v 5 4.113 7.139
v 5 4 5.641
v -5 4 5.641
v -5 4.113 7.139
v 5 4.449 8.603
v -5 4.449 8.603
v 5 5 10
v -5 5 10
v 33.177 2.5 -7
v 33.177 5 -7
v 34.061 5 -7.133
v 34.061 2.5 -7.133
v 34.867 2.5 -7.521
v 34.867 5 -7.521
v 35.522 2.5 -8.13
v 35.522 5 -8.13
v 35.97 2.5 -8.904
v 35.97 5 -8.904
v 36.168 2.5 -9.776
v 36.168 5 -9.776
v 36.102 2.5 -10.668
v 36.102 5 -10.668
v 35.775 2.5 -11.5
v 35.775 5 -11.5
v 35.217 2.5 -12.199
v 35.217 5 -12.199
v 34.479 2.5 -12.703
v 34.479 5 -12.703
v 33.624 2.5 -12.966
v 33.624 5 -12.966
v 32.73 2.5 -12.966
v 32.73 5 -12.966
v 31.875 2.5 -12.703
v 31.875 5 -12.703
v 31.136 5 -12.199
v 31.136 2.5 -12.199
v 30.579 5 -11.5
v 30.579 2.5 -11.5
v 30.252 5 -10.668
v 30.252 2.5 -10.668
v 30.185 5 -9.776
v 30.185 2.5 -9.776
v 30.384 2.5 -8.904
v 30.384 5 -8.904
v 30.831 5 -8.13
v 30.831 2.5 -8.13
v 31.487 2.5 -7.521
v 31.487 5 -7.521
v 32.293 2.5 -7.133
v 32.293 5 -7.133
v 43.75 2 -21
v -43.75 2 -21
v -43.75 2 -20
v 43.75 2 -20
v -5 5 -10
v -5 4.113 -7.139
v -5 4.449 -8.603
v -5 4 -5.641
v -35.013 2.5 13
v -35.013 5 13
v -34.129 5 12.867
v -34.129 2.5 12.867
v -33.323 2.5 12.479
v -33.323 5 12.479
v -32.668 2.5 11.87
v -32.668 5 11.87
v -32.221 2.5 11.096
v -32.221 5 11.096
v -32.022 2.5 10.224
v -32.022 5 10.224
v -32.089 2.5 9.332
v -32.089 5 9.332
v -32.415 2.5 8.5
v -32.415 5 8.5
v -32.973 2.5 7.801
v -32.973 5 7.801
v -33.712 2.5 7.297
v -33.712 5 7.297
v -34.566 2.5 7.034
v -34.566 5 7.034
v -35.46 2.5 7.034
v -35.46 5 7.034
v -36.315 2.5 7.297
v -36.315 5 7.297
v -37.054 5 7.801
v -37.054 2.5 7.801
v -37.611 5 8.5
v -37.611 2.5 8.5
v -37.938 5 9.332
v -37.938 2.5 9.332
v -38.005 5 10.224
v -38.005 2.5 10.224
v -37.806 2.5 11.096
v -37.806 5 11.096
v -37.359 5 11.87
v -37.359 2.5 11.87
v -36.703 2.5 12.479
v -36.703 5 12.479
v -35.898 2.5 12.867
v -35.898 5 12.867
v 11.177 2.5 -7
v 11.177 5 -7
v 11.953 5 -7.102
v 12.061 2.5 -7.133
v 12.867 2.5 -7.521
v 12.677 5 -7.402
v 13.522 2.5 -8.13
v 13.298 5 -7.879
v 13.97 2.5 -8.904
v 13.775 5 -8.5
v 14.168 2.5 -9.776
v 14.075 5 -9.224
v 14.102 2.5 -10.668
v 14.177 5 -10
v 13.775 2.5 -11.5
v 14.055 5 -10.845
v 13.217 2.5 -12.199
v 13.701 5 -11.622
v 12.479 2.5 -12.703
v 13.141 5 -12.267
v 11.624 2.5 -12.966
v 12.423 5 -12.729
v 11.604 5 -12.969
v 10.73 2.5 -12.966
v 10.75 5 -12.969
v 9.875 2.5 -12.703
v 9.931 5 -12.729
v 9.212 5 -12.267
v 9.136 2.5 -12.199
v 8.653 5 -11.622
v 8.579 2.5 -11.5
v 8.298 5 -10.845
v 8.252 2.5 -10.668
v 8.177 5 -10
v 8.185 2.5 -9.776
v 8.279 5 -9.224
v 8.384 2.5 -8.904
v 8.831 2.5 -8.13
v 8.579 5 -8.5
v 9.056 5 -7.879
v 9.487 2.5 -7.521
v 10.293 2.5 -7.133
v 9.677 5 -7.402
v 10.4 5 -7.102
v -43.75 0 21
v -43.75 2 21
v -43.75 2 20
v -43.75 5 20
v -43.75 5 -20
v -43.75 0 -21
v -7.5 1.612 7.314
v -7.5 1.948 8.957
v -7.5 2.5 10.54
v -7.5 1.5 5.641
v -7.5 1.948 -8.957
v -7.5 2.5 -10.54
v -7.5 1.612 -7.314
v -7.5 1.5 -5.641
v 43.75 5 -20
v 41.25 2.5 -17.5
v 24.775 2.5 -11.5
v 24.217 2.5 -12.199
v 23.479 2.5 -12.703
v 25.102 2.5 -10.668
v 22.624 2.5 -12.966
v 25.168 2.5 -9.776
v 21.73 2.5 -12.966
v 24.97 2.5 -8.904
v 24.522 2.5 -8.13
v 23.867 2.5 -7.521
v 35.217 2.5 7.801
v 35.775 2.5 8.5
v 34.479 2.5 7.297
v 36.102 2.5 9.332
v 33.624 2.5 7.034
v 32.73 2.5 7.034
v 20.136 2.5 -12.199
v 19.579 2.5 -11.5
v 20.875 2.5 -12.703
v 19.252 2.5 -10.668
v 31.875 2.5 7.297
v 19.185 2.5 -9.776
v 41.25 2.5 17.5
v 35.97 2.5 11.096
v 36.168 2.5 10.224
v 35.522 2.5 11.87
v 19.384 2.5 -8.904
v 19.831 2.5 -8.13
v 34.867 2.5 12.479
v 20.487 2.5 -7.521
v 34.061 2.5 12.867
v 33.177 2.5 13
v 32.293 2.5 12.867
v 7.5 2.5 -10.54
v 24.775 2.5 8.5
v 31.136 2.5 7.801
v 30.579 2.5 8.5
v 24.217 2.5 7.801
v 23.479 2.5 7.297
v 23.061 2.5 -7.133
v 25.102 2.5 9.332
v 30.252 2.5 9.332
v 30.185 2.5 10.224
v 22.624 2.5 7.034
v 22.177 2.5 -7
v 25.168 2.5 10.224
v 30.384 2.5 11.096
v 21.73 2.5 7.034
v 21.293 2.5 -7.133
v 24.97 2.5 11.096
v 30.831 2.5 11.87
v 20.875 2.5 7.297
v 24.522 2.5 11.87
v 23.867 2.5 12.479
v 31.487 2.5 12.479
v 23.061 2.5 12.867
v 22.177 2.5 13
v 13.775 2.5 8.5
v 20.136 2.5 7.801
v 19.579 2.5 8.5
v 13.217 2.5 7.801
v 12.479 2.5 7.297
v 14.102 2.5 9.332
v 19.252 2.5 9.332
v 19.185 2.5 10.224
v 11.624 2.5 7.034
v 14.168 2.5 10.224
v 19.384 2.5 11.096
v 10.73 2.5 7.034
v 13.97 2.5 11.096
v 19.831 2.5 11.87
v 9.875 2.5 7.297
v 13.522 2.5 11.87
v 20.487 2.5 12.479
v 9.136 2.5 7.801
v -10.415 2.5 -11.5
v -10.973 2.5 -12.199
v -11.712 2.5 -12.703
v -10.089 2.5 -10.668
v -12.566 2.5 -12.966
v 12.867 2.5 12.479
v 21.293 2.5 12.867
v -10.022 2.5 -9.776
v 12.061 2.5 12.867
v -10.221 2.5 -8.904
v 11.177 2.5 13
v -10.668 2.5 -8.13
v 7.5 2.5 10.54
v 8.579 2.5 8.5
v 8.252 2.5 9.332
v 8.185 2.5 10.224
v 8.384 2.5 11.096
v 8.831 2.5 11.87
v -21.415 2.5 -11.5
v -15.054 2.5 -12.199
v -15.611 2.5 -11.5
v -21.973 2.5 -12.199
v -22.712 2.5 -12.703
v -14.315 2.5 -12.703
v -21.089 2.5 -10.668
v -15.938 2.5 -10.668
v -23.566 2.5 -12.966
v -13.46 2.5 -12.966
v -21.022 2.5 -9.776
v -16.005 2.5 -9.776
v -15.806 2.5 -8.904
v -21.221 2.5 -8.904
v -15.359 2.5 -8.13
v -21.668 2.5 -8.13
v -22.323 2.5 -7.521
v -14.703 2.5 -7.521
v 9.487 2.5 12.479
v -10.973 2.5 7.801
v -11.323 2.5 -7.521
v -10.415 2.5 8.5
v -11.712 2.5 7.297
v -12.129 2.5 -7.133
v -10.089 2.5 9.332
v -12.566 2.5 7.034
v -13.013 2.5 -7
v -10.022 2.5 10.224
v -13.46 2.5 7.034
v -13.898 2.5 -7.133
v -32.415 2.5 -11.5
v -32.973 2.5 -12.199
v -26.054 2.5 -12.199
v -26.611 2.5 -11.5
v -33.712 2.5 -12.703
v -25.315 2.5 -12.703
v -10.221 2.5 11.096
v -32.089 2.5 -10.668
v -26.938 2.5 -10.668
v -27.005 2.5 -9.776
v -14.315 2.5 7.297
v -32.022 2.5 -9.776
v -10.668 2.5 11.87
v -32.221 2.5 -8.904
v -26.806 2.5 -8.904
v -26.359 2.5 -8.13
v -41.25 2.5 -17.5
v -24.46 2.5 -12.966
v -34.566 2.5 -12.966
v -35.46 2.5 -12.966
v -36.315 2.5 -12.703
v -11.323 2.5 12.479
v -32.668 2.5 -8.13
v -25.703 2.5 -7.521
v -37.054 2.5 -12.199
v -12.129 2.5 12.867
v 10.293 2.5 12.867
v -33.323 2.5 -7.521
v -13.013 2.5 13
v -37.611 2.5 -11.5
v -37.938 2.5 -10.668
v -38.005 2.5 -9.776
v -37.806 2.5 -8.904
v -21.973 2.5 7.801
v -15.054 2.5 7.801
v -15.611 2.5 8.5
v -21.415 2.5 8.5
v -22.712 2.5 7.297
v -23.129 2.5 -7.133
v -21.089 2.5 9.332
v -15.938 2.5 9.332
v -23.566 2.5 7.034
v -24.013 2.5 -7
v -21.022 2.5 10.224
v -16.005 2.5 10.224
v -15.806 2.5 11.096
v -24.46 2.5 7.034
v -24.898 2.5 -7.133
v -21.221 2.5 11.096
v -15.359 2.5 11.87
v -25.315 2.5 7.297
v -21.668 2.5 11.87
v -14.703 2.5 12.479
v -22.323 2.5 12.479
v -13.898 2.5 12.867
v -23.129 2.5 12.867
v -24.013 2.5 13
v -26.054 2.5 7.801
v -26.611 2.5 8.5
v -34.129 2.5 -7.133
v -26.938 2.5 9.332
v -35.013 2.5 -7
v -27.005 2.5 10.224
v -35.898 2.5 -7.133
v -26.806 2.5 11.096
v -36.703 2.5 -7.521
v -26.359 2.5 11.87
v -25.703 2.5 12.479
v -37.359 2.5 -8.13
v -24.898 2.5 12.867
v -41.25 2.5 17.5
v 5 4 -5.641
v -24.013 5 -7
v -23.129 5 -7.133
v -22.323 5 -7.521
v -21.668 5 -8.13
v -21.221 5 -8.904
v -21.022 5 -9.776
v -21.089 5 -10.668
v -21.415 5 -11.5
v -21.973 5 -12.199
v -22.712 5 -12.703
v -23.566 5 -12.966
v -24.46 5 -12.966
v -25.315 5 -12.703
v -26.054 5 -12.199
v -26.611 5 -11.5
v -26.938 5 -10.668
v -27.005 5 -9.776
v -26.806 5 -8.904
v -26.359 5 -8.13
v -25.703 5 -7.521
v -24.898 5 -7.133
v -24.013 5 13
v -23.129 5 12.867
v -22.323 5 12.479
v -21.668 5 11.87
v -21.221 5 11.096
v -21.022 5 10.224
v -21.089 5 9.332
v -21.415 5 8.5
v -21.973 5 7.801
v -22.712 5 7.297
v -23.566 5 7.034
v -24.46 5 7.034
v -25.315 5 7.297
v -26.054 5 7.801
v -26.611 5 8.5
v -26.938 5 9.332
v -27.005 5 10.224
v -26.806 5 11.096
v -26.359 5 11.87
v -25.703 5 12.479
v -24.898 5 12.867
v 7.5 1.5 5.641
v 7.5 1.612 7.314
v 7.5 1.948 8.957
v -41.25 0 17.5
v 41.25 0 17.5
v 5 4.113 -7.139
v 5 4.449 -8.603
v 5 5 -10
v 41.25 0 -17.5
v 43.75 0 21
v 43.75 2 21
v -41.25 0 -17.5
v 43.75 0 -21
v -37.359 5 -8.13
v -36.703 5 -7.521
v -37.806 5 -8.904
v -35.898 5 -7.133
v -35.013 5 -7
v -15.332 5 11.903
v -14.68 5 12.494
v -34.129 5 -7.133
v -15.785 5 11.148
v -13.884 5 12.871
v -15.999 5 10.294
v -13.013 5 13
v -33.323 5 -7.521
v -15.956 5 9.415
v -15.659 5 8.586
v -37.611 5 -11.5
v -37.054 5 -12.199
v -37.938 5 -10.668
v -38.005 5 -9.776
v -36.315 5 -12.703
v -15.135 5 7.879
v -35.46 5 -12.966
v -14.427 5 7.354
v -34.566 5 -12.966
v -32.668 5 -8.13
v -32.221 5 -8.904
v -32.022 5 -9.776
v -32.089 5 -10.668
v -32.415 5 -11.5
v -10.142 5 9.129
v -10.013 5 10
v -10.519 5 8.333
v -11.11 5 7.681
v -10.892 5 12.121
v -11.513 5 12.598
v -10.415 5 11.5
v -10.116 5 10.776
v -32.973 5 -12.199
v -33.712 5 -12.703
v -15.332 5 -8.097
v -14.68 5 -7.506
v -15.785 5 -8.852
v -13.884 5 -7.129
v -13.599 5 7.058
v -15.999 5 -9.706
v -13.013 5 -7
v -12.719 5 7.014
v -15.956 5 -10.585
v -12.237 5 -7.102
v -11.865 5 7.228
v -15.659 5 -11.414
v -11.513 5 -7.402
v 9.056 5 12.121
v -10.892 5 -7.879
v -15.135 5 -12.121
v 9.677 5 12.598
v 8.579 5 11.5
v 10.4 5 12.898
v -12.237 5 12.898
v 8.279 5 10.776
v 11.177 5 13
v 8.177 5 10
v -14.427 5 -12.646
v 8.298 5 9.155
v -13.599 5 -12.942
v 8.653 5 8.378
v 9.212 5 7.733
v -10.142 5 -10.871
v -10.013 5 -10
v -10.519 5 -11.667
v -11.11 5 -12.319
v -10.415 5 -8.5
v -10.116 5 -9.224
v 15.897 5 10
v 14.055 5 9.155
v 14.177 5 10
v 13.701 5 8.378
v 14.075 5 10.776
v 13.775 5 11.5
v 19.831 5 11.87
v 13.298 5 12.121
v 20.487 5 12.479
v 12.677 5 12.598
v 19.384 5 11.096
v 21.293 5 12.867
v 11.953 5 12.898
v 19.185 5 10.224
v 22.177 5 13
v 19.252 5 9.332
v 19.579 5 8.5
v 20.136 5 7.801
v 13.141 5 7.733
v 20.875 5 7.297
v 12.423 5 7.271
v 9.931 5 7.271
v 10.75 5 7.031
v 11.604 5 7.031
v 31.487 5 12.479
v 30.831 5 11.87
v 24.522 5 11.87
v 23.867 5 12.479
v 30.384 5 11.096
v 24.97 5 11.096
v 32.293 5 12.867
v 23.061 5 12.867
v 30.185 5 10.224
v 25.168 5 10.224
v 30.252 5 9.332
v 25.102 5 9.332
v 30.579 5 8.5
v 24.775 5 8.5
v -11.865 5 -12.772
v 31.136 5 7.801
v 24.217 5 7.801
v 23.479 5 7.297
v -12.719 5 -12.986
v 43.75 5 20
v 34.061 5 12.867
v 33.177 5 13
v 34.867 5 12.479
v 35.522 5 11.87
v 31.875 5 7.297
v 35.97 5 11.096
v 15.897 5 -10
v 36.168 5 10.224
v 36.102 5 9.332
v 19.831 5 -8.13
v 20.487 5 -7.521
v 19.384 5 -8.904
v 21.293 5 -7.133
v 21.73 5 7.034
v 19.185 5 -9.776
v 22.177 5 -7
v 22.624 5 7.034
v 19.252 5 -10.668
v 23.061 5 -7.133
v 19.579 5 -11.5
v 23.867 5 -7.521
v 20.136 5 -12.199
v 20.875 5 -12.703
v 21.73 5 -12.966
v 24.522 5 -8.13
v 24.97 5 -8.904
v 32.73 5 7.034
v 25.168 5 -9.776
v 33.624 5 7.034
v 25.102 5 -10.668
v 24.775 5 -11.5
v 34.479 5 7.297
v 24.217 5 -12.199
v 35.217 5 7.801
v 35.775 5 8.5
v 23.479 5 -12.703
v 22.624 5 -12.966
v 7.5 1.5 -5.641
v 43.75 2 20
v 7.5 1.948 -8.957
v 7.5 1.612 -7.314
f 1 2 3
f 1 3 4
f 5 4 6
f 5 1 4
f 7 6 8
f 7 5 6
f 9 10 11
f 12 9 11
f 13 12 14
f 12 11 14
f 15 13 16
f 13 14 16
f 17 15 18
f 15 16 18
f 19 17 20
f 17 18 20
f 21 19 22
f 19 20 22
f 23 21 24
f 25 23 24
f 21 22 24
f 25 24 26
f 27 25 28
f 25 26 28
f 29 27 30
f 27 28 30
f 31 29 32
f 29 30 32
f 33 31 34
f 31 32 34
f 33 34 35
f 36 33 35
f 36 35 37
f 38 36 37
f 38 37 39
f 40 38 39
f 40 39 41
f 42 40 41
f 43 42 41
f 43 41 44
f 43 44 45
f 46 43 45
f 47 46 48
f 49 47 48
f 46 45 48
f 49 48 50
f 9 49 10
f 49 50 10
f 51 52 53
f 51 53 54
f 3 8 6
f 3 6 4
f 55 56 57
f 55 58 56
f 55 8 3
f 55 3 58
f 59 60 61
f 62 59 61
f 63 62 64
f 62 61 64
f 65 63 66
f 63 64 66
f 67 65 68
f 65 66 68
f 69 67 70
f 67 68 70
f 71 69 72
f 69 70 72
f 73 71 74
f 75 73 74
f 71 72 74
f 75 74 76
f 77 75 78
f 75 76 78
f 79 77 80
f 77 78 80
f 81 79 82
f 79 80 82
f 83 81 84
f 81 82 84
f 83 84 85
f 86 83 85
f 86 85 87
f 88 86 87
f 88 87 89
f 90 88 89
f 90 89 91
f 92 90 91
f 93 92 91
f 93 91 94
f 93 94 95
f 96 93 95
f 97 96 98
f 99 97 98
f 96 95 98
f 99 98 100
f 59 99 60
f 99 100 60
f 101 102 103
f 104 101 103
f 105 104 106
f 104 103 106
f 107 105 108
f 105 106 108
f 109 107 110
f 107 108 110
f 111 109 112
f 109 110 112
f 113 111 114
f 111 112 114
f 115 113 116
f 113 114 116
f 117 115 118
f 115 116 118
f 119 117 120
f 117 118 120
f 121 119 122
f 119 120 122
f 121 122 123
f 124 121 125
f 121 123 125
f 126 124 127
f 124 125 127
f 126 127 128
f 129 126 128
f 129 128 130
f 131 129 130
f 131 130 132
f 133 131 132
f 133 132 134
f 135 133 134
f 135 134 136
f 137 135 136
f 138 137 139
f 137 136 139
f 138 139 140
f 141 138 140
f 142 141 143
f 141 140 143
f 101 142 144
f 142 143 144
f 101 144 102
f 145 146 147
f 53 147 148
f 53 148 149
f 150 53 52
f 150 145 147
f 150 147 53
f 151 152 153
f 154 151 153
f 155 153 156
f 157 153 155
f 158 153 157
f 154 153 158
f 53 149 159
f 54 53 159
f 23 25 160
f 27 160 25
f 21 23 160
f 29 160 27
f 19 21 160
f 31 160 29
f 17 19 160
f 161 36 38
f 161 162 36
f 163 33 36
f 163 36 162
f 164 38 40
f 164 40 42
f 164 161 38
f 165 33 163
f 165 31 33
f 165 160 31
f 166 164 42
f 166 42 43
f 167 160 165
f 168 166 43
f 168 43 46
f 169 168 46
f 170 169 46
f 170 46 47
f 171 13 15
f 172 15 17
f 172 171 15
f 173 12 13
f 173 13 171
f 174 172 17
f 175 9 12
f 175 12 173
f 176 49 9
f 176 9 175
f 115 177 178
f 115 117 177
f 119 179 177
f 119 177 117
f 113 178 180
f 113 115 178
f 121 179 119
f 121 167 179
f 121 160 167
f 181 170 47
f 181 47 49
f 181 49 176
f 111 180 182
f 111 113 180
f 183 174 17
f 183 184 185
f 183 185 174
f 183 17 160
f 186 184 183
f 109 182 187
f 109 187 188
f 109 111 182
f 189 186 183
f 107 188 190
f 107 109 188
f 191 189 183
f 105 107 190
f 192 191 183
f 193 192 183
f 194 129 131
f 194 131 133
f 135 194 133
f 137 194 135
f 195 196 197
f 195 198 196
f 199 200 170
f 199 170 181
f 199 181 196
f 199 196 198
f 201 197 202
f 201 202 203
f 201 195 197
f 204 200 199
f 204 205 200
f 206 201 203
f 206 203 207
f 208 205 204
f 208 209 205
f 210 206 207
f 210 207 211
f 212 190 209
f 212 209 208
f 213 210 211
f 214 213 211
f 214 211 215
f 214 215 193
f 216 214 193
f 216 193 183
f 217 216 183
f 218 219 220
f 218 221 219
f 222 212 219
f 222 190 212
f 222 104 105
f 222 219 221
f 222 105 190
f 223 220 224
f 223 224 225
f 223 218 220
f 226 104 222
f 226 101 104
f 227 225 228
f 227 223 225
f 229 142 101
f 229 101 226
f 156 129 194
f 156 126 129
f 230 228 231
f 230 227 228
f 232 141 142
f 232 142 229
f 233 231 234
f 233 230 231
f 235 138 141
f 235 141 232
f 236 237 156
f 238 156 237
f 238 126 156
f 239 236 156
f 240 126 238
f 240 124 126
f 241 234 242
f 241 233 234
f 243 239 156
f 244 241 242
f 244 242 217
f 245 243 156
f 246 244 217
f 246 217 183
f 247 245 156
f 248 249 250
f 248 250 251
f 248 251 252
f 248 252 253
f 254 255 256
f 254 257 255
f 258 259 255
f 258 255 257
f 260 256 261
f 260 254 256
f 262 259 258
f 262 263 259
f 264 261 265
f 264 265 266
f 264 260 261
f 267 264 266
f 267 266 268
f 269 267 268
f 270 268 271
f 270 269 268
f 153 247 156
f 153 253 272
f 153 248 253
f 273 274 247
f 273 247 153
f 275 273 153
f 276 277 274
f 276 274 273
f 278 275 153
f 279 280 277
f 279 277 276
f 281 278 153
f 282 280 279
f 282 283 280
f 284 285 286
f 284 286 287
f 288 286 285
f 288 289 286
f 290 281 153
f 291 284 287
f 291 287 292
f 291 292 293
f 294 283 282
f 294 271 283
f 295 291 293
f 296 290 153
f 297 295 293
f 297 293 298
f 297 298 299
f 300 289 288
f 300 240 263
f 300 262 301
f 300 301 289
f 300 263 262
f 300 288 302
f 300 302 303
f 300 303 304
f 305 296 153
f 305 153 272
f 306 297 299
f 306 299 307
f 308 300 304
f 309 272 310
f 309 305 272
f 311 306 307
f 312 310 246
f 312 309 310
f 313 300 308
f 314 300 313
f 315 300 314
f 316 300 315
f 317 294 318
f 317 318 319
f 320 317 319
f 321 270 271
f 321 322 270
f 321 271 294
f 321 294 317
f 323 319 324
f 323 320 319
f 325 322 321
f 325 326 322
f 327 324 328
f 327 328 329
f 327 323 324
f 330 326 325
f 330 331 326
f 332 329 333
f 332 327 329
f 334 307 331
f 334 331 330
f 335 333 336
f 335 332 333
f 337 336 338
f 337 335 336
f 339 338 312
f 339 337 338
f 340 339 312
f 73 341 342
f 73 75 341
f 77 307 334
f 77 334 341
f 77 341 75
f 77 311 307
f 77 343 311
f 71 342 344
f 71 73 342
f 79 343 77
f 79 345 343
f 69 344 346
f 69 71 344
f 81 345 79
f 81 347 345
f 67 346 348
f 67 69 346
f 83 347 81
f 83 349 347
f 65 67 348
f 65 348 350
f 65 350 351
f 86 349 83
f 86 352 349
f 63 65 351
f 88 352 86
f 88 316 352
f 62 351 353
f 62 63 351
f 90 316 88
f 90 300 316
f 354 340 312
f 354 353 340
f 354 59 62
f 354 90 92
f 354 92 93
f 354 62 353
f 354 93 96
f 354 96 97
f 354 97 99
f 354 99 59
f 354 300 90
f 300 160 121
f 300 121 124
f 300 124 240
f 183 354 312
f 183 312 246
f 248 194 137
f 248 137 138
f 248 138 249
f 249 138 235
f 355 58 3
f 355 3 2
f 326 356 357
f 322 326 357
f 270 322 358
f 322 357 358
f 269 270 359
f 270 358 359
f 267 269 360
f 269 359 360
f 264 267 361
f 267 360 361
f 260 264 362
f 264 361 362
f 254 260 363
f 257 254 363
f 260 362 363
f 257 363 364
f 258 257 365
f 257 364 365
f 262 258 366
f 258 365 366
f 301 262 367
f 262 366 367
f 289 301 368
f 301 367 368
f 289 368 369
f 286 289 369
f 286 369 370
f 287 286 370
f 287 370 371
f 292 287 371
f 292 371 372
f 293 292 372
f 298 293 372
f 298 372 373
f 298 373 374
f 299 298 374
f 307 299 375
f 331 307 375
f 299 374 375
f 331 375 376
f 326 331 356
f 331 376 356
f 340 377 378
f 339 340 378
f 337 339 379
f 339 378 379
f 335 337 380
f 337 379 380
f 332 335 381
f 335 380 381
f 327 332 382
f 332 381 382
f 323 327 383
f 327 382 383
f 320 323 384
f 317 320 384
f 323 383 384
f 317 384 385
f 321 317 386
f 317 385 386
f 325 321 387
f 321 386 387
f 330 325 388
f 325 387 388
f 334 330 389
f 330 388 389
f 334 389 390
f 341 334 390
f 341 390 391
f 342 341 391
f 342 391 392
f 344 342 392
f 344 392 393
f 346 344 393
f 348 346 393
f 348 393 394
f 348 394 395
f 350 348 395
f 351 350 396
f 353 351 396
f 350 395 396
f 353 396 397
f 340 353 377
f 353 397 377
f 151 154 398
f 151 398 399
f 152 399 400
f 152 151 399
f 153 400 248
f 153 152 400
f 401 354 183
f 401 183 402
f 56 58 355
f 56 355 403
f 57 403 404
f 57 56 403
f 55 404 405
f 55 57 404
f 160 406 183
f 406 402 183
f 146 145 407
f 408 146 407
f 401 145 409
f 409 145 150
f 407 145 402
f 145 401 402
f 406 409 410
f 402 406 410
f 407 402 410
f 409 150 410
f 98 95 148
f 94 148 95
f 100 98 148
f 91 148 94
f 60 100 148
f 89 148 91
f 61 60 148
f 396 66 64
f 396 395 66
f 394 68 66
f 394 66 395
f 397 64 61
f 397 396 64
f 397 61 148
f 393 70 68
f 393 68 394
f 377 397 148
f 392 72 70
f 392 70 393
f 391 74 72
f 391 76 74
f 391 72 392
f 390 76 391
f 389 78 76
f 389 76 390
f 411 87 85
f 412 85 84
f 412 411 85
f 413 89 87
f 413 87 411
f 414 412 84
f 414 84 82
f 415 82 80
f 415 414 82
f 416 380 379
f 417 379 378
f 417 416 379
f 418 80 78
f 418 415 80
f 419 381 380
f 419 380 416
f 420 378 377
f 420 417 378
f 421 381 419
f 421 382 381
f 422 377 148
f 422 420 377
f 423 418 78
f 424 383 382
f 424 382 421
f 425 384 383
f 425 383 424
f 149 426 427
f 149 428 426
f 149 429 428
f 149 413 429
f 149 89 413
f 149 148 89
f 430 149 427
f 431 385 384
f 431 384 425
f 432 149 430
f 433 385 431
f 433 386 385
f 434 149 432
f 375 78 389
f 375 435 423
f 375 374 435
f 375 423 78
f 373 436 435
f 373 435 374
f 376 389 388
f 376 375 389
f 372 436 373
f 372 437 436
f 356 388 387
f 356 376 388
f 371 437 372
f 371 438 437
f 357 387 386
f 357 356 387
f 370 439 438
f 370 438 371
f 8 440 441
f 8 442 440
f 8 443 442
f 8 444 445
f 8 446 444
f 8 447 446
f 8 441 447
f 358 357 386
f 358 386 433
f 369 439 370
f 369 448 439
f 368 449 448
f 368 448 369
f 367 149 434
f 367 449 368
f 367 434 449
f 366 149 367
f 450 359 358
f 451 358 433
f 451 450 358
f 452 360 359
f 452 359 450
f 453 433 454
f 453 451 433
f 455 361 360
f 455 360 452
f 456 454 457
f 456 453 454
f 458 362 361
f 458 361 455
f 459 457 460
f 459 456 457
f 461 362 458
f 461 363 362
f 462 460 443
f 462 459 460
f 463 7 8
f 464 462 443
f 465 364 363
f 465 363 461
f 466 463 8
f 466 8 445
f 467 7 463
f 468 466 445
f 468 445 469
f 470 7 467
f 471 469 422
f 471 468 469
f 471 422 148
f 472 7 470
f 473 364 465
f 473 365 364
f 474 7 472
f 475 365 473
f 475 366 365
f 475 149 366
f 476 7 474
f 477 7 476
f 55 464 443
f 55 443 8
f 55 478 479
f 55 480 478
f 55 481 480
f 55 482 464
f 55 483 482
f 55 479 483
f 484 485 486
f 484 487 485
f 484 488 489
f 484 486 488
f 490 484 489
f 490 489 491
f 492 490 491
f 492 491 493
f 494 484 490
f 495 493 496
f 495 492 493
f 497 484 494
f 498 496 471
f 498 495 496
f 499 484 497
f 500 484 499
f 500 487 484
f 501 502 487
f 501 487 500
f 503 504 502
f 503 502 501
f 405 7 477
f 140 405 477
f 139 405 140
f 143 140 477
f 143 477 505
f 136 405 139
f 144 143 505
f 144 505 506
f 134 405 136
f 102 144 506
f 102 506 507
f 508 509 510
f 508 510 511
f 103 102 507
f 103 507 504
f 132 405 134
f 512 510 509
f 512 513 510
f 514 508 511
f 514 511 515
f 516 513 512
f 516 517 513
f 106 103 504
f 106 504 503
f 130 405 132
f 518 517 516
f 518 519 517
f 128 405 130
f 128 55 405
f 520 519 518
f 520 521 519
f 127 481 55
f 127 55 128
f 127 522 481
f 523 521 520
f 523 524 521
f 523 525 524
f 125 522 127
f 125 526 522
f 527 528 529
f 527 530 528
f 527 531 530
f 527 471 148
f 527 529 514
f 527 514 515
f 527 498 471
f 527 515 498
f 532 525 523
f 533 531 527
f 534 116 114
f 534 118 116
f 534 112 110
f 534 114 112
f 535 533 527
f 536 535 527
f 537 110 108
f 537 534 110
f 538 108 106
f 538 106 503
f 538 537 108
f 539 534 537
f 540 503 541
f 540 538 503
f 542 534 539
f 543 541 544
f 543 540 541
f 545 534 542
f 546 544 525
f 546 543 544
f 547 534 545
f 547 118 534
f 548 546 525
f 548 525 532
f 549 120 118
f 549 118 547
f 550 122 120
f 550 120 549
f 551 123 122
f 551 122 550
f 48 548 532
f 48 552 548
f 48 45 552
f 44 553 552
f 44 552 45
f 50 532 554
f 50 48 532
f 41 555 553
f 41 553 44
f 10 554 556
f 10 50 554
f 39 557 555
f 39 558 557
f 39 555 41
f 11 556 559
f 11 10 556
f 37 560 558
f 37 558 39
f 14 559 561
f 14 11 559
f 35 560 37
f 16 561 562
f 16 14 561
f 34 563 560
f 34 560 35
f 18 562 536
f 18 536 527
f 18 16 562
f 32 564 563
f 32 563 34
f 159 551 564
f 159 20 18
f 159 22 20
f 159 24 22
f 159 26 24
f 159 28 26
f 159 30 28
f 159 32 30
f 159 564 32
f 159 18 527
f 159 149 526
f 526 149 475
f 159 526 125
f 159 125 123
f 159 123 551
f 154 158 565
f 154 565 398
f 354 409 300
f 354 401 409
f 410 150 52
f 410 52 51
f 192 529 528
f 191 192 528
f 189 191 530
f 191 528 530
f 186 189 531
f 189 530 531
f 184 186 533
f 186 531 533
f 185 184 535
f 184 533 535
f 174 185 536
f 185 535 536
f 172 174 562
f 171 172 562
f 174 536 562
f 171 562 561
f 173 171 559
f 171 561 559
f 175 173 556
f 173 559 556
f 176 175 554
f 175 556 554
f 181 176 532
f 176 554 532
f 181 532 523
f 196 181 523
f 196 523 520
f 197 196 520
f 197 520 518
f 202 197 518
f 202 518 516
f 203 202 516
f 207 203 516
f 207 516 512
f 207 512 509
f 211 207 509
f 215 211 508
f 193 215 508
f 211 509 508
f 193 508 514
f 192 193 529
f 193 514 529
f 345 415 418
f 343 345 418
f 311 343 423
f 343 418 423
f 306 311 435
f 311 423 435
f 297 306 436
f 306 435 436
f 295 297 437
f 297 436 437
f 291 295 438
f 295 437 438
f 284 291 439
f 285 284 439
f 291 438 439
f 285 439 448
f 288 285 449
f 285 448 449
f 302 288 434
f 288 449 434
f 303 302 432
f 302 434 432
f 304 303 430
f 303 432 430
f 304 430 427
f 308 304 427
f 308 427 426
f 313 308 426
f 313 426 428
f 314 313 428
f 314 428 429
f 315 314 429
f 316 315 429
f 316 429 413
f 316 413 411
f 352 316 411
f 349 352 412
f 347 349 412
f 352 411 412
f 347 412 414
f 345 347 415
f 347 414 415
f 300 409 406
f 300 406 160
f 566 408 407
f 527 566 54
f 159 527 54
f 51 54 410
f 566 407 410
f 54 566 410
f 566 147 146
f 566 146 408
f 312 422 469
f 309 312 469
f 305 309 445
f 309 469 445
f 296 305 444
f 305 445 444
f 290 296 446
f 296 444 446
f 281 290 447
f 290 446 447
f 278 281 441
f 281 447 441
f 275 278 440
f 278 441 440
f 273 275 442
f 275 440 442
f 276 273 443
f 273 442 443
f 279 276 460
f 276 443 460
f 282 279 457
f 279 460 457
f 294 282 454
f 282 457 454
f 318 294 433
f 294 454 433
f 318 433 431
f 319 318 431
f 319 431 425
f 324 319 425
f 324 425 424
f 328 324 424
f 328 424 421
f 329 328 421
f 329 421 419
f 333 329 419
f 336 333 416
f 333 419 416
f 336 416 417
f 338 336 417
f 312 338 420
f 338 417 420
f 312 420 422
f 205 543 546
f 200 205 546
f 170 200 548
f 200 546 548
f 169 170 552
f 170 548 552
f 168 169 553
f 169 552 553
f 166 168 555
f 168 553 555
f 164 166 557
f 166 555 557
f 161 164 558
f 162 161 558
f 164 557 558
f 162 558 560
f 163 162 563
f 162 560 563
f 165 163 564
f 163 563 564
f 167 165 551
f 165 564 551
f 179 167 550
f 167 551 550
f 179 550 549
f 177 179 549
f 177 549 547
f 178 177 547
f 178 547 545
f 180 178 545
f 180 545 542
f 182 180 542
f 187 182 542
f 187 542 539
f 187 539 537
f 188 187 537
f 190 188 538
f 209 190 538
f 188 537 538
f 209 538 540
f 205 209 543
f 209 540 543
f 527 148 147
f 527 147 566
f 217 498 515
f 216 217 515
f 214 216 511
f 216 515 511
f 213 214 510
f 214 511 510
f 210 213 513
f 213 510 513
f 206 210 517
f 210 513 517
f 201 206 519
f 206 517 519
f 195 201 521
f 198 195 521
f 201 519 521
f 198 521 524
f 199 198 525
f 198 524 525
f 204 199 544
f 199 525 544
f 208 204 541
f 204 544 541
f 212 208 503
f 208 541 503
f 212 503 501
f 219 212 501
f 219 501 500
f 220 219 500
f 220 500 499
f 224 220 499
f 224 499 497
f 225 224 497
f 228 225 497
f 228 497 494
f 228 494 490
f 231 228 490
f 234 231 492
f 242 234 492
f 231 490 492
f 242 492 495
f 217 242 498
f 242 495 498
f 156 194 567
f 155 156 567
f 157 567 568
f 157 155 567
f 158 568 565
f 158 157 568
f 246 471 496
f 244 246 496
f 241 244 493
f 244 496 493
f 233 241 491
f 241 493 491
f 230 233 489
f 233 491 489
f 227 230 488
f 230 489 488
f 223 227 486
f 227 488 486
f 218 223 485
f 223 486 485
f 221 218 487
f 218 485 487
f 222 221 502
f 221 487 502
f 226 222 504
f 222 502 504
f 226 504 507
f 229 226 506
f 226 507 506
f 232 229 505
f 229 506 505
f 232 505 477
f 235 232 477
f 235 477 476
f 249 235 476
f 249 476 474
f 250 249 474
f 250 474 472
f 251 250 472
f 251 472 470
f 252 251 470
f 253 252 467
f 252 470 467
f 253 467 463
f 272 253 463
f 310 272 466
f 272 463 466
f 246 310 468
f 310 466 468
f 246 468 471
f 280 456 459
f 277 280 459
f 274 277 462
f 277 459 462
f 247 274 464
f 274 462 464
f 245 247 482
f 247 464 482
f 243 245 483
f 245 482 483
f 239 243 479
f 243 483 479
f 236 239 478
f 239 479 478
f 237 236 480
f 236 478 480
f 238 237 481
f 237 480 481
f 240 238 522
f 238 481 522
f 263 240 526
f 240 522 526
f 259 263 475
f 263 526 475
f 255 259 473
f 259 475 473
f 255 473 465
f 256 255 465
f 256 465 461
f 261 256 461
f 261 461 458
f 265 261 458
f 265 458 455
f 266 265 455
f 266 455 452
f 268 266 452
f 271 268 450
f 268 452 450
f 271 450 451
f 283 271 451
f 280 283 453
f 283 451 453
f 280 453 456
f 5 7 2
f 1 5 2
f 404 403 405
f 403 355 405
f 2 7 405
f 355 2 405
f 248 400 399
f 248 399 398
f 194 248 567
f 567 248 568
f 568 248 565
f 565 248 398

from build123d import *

# Parameters (mm, degrees)
SKETCH1_W           = 87.5
SKETCH1_H           = 42
BOSS_EXTRUDE1_DEPTH = 5
SKETCH2_W           = 87.5
SKETCH2_H           = 1
CUT_EXTRUDE1_DEPTH  = 3
SKETCH3_W           = 87.5
SKETCH3_H           = 1
CUT_EXTRUDE2_DEPTH  = 3
SKETCH4_W           = 10
SKETCH4_H           = 20
CUT_EXTRUDE3_DEPTH  = 1
FILLET1_R           = 10
FILLET2_R           = 10
SHELL6_START        = -41.25
SHELL6_DEPTH        = 82.5
SHELL6_2_DEPTH      = 33.75
SHELL6_START_2      = 7.5
SHELL6_3_DEPTH      = 33.75
SKETCH5_R           = 3
CUT_EXTRUDE4_DEPTH  = 2.5
LPATTERN1_COUNT     = 3
LPATTERN1_PITCH     = 11


# Read off the part's stored shape, not the designer's step: Shell6
with BuildPart() as part:
    # Sketch1 → Boss-Extrude1 (new body)
    with BuildSketch(Plane(origin=(0, 0, 0), x_dir=(1, 0, 0), z_dir=(0, 1, 0))):
        Rectangle(SKETCH1_W, SKETCH1_H)
    extrude(amount=BOSS_EXTRUDE1_DEPTH)

    # Sketch2 → Cut-Extrude1 (cut)
    with BuildSketch(Plane(origin=(0, 5, 0), x_dir=(1, 0, 0), z_dir=(0, 1, 0))):
        with Locations((0, 20.5)):
            Rectangle(SKETCH2_W, SKETCH2_H)
    extrude(amount=-CUT_EXTRUDE1_DEPTH, mode=Mode.SUBTRACT)

    # Sketch3 → Cut-Extrude2 (cut)
    with BuildSketch(Plane(origin=(0, 5, 0), x_dir=(1, 0, 0), z_dir=(0, 1, 0))):
        with Locations((0, -20.5)):
            Rectangle(SKETCH3_W, SKETCH3_H)
    extrude(amount=-CUT_EXTRUDE2_DEPTH, mode=Mode.SUBTRACT)

    # Sketch4 → Cut-Extrude3 (cut)
    with BuildSketch(Plane(origin=(0, 5, 0), x_dir=(1, 0, 0), z_dir=(0, 1, 0))):
        Rectangle(SKETCH4_W, SKETCH4_H)
    extrude(amount=-CUT_EXTRUDE3_DEPTH, mode=Mode.SUBTRACT)

    # Fillet1
    # the kernel refuses this fillet: 10 mm, written as the material it adds along each edge
    with BuildSketch(Plane(origin=(15.897247359, 4, 10), x_dir=(0, 1, 0), z_dir=(-1, 0, 0))) as fillet1_piece_1:
        with BuildLine():
            CenterArc((10, 4.358898944), FILLET1_R, 180, 25.841932763)
            Line((0, 4.358898944), (-0.2, 4.358898944))
            Line((-0.2, 4.358898944), (-0.2, 0))
            Line((-0.2, 0), (0, -0.2))
            ThreePointArc((0, -0.2), (0.5, -0.2), (0.82, -0.087177979))
            Line((0.82, -0.087177979), (1, 0))
        make_face()
    extrude(amount=31.794494718)

    # Fillet2
    # the kernel refuses this fillet: 10 mm, written as the material it adds along each edge
    with BuildSketch(Plane(origin=(-15.897247359, 4, -10), x_dir=(0, 0, 1), z_dir=(1, 0, 0))) as fillet2_piece_1:
        with BuildLine():
            CenterArc((4.358898944, -10), FILLET2_R, 90, 25.841932763)
            Line((0, -1), (-0.087177979, -0.82))
            ThreePointArc((-0.087177979, -0.82), (-0.2, -0.5), (-0.2, 0))
            Line((-0.2, 0), (0, 0.2))
            Line((0, 0.2), (4.358898944, 0.2))
            Line((4.358898944, 0.2), (4.358898944, 0))
        make_face()
    extrude(amount=31.794494718)

    # Shell6 outline → Shell6 (cut)
    with BuildSketch(Plane.YZ.offset(SHELL6_START)):
        with BuildLine():
            Line((0, -17.5), (2.5, -17.5))
            Line((2.5, -17.5), (2.5, -10.540080542))
            ThreePointArc((2.5, -10.540080542), (1.752551286, -8.141101056), (1.5, -5.641101056))
            Line((1.5, -5.641101056), (1.5, 5.641101056))
            ThreePointArc((1.5, 5.641101056), (1.752551286, 8.141101056), (2.5, 10.540080542))
            Line((2.5, 10.540080542), (2.5, 17.5))
            Line((2.5, 17.5), (0, 17.5))
            Line((0, 17.5), (0, -17.5))
        make_face()
    extrude(amount=SHELL6_DEPTH, mode=Mode.SUBTRACT)

    # Shell6 2 outline → Shell6 2 (cut)
    with BuildSketch(Plane.YZ.offset(SHELL6_START)):
        with BuildLine():
            ThreePointArc((1.5, -5.641101056), (1.752551286, -8.141101056), (2.5, -10.540080542))
            Line((2.5, -10.540080542), (2.5, 10.540080542))
            ThreePointArc((2.5, 10.540080542), (1.752551286, 8.141101056), (1.5, 5.641101056))
            Line((1.5, 5.641101056), (1.5, -5.641101056))
        make_face()
    extrude(amount=SHELL6_2_DEPTH, mode=Mode.SUBTRACT)

    # Shell6 3 outline → Shell6 3 (cut)
    with BuildSketch(Plane.YZ.offset(SHELL6_START_2)):
        with BuildLine():
            ThreePointArc((1.5, -5.641101056), (1.752551286, -8.141101056), (2.5, -10.540080542))
            Line((2.5, -10.540080542), (2.5, 10.540080542))
            ThreePointArc((2.5, 10.540080542), (1.752551286, 8.141101056), (1.5, 5.641101056))
            Line((1.5, 5.641101056), (1.5, -5.641101056))
        make_face()
    extrude(amount=SHELL6_3_DEPTH, mode=Mode.SUBTRACT)

    # Sketch5 → Cut-Extrude4 (cut)
    with BuildSketch(Plane(origin=(0, 5, 0), x_dir=(1, 0, 0), z_dir=(0, 1, 0))):
        with Locations(Location((-35.01329609, 10, 0), (0, 0, 270))):
            Circle(SKETCH5_R)
        with Locations(Location((-35.01329609, -10, 0), (0, 0, 270))):
            Circle(SKETCH5_R)
        with Locations(Location((11.17688744, 10, 0), (0, 0, 270))):
            Circle(SKETCH5_R)
        with Locations(Location((11.17688744, -10, 0), (0, 0, 270))):
            Circle(SKETCH5_R)
    cut_extrude4 = extrude(amount=-CUT_EXTRUDE4_DEPTH, mode=Mode.SUBTRACT)

    # LPattern1: Cut-Extrude4 ×3
    with Locations(*[(i * LPATTERN1_PITCH, 0, 0) for i in range(1, LPATTERN1_COUNT)]):
        add(cut_extrude4, mode=Mode.SUBTRACT)


solid = part.part
